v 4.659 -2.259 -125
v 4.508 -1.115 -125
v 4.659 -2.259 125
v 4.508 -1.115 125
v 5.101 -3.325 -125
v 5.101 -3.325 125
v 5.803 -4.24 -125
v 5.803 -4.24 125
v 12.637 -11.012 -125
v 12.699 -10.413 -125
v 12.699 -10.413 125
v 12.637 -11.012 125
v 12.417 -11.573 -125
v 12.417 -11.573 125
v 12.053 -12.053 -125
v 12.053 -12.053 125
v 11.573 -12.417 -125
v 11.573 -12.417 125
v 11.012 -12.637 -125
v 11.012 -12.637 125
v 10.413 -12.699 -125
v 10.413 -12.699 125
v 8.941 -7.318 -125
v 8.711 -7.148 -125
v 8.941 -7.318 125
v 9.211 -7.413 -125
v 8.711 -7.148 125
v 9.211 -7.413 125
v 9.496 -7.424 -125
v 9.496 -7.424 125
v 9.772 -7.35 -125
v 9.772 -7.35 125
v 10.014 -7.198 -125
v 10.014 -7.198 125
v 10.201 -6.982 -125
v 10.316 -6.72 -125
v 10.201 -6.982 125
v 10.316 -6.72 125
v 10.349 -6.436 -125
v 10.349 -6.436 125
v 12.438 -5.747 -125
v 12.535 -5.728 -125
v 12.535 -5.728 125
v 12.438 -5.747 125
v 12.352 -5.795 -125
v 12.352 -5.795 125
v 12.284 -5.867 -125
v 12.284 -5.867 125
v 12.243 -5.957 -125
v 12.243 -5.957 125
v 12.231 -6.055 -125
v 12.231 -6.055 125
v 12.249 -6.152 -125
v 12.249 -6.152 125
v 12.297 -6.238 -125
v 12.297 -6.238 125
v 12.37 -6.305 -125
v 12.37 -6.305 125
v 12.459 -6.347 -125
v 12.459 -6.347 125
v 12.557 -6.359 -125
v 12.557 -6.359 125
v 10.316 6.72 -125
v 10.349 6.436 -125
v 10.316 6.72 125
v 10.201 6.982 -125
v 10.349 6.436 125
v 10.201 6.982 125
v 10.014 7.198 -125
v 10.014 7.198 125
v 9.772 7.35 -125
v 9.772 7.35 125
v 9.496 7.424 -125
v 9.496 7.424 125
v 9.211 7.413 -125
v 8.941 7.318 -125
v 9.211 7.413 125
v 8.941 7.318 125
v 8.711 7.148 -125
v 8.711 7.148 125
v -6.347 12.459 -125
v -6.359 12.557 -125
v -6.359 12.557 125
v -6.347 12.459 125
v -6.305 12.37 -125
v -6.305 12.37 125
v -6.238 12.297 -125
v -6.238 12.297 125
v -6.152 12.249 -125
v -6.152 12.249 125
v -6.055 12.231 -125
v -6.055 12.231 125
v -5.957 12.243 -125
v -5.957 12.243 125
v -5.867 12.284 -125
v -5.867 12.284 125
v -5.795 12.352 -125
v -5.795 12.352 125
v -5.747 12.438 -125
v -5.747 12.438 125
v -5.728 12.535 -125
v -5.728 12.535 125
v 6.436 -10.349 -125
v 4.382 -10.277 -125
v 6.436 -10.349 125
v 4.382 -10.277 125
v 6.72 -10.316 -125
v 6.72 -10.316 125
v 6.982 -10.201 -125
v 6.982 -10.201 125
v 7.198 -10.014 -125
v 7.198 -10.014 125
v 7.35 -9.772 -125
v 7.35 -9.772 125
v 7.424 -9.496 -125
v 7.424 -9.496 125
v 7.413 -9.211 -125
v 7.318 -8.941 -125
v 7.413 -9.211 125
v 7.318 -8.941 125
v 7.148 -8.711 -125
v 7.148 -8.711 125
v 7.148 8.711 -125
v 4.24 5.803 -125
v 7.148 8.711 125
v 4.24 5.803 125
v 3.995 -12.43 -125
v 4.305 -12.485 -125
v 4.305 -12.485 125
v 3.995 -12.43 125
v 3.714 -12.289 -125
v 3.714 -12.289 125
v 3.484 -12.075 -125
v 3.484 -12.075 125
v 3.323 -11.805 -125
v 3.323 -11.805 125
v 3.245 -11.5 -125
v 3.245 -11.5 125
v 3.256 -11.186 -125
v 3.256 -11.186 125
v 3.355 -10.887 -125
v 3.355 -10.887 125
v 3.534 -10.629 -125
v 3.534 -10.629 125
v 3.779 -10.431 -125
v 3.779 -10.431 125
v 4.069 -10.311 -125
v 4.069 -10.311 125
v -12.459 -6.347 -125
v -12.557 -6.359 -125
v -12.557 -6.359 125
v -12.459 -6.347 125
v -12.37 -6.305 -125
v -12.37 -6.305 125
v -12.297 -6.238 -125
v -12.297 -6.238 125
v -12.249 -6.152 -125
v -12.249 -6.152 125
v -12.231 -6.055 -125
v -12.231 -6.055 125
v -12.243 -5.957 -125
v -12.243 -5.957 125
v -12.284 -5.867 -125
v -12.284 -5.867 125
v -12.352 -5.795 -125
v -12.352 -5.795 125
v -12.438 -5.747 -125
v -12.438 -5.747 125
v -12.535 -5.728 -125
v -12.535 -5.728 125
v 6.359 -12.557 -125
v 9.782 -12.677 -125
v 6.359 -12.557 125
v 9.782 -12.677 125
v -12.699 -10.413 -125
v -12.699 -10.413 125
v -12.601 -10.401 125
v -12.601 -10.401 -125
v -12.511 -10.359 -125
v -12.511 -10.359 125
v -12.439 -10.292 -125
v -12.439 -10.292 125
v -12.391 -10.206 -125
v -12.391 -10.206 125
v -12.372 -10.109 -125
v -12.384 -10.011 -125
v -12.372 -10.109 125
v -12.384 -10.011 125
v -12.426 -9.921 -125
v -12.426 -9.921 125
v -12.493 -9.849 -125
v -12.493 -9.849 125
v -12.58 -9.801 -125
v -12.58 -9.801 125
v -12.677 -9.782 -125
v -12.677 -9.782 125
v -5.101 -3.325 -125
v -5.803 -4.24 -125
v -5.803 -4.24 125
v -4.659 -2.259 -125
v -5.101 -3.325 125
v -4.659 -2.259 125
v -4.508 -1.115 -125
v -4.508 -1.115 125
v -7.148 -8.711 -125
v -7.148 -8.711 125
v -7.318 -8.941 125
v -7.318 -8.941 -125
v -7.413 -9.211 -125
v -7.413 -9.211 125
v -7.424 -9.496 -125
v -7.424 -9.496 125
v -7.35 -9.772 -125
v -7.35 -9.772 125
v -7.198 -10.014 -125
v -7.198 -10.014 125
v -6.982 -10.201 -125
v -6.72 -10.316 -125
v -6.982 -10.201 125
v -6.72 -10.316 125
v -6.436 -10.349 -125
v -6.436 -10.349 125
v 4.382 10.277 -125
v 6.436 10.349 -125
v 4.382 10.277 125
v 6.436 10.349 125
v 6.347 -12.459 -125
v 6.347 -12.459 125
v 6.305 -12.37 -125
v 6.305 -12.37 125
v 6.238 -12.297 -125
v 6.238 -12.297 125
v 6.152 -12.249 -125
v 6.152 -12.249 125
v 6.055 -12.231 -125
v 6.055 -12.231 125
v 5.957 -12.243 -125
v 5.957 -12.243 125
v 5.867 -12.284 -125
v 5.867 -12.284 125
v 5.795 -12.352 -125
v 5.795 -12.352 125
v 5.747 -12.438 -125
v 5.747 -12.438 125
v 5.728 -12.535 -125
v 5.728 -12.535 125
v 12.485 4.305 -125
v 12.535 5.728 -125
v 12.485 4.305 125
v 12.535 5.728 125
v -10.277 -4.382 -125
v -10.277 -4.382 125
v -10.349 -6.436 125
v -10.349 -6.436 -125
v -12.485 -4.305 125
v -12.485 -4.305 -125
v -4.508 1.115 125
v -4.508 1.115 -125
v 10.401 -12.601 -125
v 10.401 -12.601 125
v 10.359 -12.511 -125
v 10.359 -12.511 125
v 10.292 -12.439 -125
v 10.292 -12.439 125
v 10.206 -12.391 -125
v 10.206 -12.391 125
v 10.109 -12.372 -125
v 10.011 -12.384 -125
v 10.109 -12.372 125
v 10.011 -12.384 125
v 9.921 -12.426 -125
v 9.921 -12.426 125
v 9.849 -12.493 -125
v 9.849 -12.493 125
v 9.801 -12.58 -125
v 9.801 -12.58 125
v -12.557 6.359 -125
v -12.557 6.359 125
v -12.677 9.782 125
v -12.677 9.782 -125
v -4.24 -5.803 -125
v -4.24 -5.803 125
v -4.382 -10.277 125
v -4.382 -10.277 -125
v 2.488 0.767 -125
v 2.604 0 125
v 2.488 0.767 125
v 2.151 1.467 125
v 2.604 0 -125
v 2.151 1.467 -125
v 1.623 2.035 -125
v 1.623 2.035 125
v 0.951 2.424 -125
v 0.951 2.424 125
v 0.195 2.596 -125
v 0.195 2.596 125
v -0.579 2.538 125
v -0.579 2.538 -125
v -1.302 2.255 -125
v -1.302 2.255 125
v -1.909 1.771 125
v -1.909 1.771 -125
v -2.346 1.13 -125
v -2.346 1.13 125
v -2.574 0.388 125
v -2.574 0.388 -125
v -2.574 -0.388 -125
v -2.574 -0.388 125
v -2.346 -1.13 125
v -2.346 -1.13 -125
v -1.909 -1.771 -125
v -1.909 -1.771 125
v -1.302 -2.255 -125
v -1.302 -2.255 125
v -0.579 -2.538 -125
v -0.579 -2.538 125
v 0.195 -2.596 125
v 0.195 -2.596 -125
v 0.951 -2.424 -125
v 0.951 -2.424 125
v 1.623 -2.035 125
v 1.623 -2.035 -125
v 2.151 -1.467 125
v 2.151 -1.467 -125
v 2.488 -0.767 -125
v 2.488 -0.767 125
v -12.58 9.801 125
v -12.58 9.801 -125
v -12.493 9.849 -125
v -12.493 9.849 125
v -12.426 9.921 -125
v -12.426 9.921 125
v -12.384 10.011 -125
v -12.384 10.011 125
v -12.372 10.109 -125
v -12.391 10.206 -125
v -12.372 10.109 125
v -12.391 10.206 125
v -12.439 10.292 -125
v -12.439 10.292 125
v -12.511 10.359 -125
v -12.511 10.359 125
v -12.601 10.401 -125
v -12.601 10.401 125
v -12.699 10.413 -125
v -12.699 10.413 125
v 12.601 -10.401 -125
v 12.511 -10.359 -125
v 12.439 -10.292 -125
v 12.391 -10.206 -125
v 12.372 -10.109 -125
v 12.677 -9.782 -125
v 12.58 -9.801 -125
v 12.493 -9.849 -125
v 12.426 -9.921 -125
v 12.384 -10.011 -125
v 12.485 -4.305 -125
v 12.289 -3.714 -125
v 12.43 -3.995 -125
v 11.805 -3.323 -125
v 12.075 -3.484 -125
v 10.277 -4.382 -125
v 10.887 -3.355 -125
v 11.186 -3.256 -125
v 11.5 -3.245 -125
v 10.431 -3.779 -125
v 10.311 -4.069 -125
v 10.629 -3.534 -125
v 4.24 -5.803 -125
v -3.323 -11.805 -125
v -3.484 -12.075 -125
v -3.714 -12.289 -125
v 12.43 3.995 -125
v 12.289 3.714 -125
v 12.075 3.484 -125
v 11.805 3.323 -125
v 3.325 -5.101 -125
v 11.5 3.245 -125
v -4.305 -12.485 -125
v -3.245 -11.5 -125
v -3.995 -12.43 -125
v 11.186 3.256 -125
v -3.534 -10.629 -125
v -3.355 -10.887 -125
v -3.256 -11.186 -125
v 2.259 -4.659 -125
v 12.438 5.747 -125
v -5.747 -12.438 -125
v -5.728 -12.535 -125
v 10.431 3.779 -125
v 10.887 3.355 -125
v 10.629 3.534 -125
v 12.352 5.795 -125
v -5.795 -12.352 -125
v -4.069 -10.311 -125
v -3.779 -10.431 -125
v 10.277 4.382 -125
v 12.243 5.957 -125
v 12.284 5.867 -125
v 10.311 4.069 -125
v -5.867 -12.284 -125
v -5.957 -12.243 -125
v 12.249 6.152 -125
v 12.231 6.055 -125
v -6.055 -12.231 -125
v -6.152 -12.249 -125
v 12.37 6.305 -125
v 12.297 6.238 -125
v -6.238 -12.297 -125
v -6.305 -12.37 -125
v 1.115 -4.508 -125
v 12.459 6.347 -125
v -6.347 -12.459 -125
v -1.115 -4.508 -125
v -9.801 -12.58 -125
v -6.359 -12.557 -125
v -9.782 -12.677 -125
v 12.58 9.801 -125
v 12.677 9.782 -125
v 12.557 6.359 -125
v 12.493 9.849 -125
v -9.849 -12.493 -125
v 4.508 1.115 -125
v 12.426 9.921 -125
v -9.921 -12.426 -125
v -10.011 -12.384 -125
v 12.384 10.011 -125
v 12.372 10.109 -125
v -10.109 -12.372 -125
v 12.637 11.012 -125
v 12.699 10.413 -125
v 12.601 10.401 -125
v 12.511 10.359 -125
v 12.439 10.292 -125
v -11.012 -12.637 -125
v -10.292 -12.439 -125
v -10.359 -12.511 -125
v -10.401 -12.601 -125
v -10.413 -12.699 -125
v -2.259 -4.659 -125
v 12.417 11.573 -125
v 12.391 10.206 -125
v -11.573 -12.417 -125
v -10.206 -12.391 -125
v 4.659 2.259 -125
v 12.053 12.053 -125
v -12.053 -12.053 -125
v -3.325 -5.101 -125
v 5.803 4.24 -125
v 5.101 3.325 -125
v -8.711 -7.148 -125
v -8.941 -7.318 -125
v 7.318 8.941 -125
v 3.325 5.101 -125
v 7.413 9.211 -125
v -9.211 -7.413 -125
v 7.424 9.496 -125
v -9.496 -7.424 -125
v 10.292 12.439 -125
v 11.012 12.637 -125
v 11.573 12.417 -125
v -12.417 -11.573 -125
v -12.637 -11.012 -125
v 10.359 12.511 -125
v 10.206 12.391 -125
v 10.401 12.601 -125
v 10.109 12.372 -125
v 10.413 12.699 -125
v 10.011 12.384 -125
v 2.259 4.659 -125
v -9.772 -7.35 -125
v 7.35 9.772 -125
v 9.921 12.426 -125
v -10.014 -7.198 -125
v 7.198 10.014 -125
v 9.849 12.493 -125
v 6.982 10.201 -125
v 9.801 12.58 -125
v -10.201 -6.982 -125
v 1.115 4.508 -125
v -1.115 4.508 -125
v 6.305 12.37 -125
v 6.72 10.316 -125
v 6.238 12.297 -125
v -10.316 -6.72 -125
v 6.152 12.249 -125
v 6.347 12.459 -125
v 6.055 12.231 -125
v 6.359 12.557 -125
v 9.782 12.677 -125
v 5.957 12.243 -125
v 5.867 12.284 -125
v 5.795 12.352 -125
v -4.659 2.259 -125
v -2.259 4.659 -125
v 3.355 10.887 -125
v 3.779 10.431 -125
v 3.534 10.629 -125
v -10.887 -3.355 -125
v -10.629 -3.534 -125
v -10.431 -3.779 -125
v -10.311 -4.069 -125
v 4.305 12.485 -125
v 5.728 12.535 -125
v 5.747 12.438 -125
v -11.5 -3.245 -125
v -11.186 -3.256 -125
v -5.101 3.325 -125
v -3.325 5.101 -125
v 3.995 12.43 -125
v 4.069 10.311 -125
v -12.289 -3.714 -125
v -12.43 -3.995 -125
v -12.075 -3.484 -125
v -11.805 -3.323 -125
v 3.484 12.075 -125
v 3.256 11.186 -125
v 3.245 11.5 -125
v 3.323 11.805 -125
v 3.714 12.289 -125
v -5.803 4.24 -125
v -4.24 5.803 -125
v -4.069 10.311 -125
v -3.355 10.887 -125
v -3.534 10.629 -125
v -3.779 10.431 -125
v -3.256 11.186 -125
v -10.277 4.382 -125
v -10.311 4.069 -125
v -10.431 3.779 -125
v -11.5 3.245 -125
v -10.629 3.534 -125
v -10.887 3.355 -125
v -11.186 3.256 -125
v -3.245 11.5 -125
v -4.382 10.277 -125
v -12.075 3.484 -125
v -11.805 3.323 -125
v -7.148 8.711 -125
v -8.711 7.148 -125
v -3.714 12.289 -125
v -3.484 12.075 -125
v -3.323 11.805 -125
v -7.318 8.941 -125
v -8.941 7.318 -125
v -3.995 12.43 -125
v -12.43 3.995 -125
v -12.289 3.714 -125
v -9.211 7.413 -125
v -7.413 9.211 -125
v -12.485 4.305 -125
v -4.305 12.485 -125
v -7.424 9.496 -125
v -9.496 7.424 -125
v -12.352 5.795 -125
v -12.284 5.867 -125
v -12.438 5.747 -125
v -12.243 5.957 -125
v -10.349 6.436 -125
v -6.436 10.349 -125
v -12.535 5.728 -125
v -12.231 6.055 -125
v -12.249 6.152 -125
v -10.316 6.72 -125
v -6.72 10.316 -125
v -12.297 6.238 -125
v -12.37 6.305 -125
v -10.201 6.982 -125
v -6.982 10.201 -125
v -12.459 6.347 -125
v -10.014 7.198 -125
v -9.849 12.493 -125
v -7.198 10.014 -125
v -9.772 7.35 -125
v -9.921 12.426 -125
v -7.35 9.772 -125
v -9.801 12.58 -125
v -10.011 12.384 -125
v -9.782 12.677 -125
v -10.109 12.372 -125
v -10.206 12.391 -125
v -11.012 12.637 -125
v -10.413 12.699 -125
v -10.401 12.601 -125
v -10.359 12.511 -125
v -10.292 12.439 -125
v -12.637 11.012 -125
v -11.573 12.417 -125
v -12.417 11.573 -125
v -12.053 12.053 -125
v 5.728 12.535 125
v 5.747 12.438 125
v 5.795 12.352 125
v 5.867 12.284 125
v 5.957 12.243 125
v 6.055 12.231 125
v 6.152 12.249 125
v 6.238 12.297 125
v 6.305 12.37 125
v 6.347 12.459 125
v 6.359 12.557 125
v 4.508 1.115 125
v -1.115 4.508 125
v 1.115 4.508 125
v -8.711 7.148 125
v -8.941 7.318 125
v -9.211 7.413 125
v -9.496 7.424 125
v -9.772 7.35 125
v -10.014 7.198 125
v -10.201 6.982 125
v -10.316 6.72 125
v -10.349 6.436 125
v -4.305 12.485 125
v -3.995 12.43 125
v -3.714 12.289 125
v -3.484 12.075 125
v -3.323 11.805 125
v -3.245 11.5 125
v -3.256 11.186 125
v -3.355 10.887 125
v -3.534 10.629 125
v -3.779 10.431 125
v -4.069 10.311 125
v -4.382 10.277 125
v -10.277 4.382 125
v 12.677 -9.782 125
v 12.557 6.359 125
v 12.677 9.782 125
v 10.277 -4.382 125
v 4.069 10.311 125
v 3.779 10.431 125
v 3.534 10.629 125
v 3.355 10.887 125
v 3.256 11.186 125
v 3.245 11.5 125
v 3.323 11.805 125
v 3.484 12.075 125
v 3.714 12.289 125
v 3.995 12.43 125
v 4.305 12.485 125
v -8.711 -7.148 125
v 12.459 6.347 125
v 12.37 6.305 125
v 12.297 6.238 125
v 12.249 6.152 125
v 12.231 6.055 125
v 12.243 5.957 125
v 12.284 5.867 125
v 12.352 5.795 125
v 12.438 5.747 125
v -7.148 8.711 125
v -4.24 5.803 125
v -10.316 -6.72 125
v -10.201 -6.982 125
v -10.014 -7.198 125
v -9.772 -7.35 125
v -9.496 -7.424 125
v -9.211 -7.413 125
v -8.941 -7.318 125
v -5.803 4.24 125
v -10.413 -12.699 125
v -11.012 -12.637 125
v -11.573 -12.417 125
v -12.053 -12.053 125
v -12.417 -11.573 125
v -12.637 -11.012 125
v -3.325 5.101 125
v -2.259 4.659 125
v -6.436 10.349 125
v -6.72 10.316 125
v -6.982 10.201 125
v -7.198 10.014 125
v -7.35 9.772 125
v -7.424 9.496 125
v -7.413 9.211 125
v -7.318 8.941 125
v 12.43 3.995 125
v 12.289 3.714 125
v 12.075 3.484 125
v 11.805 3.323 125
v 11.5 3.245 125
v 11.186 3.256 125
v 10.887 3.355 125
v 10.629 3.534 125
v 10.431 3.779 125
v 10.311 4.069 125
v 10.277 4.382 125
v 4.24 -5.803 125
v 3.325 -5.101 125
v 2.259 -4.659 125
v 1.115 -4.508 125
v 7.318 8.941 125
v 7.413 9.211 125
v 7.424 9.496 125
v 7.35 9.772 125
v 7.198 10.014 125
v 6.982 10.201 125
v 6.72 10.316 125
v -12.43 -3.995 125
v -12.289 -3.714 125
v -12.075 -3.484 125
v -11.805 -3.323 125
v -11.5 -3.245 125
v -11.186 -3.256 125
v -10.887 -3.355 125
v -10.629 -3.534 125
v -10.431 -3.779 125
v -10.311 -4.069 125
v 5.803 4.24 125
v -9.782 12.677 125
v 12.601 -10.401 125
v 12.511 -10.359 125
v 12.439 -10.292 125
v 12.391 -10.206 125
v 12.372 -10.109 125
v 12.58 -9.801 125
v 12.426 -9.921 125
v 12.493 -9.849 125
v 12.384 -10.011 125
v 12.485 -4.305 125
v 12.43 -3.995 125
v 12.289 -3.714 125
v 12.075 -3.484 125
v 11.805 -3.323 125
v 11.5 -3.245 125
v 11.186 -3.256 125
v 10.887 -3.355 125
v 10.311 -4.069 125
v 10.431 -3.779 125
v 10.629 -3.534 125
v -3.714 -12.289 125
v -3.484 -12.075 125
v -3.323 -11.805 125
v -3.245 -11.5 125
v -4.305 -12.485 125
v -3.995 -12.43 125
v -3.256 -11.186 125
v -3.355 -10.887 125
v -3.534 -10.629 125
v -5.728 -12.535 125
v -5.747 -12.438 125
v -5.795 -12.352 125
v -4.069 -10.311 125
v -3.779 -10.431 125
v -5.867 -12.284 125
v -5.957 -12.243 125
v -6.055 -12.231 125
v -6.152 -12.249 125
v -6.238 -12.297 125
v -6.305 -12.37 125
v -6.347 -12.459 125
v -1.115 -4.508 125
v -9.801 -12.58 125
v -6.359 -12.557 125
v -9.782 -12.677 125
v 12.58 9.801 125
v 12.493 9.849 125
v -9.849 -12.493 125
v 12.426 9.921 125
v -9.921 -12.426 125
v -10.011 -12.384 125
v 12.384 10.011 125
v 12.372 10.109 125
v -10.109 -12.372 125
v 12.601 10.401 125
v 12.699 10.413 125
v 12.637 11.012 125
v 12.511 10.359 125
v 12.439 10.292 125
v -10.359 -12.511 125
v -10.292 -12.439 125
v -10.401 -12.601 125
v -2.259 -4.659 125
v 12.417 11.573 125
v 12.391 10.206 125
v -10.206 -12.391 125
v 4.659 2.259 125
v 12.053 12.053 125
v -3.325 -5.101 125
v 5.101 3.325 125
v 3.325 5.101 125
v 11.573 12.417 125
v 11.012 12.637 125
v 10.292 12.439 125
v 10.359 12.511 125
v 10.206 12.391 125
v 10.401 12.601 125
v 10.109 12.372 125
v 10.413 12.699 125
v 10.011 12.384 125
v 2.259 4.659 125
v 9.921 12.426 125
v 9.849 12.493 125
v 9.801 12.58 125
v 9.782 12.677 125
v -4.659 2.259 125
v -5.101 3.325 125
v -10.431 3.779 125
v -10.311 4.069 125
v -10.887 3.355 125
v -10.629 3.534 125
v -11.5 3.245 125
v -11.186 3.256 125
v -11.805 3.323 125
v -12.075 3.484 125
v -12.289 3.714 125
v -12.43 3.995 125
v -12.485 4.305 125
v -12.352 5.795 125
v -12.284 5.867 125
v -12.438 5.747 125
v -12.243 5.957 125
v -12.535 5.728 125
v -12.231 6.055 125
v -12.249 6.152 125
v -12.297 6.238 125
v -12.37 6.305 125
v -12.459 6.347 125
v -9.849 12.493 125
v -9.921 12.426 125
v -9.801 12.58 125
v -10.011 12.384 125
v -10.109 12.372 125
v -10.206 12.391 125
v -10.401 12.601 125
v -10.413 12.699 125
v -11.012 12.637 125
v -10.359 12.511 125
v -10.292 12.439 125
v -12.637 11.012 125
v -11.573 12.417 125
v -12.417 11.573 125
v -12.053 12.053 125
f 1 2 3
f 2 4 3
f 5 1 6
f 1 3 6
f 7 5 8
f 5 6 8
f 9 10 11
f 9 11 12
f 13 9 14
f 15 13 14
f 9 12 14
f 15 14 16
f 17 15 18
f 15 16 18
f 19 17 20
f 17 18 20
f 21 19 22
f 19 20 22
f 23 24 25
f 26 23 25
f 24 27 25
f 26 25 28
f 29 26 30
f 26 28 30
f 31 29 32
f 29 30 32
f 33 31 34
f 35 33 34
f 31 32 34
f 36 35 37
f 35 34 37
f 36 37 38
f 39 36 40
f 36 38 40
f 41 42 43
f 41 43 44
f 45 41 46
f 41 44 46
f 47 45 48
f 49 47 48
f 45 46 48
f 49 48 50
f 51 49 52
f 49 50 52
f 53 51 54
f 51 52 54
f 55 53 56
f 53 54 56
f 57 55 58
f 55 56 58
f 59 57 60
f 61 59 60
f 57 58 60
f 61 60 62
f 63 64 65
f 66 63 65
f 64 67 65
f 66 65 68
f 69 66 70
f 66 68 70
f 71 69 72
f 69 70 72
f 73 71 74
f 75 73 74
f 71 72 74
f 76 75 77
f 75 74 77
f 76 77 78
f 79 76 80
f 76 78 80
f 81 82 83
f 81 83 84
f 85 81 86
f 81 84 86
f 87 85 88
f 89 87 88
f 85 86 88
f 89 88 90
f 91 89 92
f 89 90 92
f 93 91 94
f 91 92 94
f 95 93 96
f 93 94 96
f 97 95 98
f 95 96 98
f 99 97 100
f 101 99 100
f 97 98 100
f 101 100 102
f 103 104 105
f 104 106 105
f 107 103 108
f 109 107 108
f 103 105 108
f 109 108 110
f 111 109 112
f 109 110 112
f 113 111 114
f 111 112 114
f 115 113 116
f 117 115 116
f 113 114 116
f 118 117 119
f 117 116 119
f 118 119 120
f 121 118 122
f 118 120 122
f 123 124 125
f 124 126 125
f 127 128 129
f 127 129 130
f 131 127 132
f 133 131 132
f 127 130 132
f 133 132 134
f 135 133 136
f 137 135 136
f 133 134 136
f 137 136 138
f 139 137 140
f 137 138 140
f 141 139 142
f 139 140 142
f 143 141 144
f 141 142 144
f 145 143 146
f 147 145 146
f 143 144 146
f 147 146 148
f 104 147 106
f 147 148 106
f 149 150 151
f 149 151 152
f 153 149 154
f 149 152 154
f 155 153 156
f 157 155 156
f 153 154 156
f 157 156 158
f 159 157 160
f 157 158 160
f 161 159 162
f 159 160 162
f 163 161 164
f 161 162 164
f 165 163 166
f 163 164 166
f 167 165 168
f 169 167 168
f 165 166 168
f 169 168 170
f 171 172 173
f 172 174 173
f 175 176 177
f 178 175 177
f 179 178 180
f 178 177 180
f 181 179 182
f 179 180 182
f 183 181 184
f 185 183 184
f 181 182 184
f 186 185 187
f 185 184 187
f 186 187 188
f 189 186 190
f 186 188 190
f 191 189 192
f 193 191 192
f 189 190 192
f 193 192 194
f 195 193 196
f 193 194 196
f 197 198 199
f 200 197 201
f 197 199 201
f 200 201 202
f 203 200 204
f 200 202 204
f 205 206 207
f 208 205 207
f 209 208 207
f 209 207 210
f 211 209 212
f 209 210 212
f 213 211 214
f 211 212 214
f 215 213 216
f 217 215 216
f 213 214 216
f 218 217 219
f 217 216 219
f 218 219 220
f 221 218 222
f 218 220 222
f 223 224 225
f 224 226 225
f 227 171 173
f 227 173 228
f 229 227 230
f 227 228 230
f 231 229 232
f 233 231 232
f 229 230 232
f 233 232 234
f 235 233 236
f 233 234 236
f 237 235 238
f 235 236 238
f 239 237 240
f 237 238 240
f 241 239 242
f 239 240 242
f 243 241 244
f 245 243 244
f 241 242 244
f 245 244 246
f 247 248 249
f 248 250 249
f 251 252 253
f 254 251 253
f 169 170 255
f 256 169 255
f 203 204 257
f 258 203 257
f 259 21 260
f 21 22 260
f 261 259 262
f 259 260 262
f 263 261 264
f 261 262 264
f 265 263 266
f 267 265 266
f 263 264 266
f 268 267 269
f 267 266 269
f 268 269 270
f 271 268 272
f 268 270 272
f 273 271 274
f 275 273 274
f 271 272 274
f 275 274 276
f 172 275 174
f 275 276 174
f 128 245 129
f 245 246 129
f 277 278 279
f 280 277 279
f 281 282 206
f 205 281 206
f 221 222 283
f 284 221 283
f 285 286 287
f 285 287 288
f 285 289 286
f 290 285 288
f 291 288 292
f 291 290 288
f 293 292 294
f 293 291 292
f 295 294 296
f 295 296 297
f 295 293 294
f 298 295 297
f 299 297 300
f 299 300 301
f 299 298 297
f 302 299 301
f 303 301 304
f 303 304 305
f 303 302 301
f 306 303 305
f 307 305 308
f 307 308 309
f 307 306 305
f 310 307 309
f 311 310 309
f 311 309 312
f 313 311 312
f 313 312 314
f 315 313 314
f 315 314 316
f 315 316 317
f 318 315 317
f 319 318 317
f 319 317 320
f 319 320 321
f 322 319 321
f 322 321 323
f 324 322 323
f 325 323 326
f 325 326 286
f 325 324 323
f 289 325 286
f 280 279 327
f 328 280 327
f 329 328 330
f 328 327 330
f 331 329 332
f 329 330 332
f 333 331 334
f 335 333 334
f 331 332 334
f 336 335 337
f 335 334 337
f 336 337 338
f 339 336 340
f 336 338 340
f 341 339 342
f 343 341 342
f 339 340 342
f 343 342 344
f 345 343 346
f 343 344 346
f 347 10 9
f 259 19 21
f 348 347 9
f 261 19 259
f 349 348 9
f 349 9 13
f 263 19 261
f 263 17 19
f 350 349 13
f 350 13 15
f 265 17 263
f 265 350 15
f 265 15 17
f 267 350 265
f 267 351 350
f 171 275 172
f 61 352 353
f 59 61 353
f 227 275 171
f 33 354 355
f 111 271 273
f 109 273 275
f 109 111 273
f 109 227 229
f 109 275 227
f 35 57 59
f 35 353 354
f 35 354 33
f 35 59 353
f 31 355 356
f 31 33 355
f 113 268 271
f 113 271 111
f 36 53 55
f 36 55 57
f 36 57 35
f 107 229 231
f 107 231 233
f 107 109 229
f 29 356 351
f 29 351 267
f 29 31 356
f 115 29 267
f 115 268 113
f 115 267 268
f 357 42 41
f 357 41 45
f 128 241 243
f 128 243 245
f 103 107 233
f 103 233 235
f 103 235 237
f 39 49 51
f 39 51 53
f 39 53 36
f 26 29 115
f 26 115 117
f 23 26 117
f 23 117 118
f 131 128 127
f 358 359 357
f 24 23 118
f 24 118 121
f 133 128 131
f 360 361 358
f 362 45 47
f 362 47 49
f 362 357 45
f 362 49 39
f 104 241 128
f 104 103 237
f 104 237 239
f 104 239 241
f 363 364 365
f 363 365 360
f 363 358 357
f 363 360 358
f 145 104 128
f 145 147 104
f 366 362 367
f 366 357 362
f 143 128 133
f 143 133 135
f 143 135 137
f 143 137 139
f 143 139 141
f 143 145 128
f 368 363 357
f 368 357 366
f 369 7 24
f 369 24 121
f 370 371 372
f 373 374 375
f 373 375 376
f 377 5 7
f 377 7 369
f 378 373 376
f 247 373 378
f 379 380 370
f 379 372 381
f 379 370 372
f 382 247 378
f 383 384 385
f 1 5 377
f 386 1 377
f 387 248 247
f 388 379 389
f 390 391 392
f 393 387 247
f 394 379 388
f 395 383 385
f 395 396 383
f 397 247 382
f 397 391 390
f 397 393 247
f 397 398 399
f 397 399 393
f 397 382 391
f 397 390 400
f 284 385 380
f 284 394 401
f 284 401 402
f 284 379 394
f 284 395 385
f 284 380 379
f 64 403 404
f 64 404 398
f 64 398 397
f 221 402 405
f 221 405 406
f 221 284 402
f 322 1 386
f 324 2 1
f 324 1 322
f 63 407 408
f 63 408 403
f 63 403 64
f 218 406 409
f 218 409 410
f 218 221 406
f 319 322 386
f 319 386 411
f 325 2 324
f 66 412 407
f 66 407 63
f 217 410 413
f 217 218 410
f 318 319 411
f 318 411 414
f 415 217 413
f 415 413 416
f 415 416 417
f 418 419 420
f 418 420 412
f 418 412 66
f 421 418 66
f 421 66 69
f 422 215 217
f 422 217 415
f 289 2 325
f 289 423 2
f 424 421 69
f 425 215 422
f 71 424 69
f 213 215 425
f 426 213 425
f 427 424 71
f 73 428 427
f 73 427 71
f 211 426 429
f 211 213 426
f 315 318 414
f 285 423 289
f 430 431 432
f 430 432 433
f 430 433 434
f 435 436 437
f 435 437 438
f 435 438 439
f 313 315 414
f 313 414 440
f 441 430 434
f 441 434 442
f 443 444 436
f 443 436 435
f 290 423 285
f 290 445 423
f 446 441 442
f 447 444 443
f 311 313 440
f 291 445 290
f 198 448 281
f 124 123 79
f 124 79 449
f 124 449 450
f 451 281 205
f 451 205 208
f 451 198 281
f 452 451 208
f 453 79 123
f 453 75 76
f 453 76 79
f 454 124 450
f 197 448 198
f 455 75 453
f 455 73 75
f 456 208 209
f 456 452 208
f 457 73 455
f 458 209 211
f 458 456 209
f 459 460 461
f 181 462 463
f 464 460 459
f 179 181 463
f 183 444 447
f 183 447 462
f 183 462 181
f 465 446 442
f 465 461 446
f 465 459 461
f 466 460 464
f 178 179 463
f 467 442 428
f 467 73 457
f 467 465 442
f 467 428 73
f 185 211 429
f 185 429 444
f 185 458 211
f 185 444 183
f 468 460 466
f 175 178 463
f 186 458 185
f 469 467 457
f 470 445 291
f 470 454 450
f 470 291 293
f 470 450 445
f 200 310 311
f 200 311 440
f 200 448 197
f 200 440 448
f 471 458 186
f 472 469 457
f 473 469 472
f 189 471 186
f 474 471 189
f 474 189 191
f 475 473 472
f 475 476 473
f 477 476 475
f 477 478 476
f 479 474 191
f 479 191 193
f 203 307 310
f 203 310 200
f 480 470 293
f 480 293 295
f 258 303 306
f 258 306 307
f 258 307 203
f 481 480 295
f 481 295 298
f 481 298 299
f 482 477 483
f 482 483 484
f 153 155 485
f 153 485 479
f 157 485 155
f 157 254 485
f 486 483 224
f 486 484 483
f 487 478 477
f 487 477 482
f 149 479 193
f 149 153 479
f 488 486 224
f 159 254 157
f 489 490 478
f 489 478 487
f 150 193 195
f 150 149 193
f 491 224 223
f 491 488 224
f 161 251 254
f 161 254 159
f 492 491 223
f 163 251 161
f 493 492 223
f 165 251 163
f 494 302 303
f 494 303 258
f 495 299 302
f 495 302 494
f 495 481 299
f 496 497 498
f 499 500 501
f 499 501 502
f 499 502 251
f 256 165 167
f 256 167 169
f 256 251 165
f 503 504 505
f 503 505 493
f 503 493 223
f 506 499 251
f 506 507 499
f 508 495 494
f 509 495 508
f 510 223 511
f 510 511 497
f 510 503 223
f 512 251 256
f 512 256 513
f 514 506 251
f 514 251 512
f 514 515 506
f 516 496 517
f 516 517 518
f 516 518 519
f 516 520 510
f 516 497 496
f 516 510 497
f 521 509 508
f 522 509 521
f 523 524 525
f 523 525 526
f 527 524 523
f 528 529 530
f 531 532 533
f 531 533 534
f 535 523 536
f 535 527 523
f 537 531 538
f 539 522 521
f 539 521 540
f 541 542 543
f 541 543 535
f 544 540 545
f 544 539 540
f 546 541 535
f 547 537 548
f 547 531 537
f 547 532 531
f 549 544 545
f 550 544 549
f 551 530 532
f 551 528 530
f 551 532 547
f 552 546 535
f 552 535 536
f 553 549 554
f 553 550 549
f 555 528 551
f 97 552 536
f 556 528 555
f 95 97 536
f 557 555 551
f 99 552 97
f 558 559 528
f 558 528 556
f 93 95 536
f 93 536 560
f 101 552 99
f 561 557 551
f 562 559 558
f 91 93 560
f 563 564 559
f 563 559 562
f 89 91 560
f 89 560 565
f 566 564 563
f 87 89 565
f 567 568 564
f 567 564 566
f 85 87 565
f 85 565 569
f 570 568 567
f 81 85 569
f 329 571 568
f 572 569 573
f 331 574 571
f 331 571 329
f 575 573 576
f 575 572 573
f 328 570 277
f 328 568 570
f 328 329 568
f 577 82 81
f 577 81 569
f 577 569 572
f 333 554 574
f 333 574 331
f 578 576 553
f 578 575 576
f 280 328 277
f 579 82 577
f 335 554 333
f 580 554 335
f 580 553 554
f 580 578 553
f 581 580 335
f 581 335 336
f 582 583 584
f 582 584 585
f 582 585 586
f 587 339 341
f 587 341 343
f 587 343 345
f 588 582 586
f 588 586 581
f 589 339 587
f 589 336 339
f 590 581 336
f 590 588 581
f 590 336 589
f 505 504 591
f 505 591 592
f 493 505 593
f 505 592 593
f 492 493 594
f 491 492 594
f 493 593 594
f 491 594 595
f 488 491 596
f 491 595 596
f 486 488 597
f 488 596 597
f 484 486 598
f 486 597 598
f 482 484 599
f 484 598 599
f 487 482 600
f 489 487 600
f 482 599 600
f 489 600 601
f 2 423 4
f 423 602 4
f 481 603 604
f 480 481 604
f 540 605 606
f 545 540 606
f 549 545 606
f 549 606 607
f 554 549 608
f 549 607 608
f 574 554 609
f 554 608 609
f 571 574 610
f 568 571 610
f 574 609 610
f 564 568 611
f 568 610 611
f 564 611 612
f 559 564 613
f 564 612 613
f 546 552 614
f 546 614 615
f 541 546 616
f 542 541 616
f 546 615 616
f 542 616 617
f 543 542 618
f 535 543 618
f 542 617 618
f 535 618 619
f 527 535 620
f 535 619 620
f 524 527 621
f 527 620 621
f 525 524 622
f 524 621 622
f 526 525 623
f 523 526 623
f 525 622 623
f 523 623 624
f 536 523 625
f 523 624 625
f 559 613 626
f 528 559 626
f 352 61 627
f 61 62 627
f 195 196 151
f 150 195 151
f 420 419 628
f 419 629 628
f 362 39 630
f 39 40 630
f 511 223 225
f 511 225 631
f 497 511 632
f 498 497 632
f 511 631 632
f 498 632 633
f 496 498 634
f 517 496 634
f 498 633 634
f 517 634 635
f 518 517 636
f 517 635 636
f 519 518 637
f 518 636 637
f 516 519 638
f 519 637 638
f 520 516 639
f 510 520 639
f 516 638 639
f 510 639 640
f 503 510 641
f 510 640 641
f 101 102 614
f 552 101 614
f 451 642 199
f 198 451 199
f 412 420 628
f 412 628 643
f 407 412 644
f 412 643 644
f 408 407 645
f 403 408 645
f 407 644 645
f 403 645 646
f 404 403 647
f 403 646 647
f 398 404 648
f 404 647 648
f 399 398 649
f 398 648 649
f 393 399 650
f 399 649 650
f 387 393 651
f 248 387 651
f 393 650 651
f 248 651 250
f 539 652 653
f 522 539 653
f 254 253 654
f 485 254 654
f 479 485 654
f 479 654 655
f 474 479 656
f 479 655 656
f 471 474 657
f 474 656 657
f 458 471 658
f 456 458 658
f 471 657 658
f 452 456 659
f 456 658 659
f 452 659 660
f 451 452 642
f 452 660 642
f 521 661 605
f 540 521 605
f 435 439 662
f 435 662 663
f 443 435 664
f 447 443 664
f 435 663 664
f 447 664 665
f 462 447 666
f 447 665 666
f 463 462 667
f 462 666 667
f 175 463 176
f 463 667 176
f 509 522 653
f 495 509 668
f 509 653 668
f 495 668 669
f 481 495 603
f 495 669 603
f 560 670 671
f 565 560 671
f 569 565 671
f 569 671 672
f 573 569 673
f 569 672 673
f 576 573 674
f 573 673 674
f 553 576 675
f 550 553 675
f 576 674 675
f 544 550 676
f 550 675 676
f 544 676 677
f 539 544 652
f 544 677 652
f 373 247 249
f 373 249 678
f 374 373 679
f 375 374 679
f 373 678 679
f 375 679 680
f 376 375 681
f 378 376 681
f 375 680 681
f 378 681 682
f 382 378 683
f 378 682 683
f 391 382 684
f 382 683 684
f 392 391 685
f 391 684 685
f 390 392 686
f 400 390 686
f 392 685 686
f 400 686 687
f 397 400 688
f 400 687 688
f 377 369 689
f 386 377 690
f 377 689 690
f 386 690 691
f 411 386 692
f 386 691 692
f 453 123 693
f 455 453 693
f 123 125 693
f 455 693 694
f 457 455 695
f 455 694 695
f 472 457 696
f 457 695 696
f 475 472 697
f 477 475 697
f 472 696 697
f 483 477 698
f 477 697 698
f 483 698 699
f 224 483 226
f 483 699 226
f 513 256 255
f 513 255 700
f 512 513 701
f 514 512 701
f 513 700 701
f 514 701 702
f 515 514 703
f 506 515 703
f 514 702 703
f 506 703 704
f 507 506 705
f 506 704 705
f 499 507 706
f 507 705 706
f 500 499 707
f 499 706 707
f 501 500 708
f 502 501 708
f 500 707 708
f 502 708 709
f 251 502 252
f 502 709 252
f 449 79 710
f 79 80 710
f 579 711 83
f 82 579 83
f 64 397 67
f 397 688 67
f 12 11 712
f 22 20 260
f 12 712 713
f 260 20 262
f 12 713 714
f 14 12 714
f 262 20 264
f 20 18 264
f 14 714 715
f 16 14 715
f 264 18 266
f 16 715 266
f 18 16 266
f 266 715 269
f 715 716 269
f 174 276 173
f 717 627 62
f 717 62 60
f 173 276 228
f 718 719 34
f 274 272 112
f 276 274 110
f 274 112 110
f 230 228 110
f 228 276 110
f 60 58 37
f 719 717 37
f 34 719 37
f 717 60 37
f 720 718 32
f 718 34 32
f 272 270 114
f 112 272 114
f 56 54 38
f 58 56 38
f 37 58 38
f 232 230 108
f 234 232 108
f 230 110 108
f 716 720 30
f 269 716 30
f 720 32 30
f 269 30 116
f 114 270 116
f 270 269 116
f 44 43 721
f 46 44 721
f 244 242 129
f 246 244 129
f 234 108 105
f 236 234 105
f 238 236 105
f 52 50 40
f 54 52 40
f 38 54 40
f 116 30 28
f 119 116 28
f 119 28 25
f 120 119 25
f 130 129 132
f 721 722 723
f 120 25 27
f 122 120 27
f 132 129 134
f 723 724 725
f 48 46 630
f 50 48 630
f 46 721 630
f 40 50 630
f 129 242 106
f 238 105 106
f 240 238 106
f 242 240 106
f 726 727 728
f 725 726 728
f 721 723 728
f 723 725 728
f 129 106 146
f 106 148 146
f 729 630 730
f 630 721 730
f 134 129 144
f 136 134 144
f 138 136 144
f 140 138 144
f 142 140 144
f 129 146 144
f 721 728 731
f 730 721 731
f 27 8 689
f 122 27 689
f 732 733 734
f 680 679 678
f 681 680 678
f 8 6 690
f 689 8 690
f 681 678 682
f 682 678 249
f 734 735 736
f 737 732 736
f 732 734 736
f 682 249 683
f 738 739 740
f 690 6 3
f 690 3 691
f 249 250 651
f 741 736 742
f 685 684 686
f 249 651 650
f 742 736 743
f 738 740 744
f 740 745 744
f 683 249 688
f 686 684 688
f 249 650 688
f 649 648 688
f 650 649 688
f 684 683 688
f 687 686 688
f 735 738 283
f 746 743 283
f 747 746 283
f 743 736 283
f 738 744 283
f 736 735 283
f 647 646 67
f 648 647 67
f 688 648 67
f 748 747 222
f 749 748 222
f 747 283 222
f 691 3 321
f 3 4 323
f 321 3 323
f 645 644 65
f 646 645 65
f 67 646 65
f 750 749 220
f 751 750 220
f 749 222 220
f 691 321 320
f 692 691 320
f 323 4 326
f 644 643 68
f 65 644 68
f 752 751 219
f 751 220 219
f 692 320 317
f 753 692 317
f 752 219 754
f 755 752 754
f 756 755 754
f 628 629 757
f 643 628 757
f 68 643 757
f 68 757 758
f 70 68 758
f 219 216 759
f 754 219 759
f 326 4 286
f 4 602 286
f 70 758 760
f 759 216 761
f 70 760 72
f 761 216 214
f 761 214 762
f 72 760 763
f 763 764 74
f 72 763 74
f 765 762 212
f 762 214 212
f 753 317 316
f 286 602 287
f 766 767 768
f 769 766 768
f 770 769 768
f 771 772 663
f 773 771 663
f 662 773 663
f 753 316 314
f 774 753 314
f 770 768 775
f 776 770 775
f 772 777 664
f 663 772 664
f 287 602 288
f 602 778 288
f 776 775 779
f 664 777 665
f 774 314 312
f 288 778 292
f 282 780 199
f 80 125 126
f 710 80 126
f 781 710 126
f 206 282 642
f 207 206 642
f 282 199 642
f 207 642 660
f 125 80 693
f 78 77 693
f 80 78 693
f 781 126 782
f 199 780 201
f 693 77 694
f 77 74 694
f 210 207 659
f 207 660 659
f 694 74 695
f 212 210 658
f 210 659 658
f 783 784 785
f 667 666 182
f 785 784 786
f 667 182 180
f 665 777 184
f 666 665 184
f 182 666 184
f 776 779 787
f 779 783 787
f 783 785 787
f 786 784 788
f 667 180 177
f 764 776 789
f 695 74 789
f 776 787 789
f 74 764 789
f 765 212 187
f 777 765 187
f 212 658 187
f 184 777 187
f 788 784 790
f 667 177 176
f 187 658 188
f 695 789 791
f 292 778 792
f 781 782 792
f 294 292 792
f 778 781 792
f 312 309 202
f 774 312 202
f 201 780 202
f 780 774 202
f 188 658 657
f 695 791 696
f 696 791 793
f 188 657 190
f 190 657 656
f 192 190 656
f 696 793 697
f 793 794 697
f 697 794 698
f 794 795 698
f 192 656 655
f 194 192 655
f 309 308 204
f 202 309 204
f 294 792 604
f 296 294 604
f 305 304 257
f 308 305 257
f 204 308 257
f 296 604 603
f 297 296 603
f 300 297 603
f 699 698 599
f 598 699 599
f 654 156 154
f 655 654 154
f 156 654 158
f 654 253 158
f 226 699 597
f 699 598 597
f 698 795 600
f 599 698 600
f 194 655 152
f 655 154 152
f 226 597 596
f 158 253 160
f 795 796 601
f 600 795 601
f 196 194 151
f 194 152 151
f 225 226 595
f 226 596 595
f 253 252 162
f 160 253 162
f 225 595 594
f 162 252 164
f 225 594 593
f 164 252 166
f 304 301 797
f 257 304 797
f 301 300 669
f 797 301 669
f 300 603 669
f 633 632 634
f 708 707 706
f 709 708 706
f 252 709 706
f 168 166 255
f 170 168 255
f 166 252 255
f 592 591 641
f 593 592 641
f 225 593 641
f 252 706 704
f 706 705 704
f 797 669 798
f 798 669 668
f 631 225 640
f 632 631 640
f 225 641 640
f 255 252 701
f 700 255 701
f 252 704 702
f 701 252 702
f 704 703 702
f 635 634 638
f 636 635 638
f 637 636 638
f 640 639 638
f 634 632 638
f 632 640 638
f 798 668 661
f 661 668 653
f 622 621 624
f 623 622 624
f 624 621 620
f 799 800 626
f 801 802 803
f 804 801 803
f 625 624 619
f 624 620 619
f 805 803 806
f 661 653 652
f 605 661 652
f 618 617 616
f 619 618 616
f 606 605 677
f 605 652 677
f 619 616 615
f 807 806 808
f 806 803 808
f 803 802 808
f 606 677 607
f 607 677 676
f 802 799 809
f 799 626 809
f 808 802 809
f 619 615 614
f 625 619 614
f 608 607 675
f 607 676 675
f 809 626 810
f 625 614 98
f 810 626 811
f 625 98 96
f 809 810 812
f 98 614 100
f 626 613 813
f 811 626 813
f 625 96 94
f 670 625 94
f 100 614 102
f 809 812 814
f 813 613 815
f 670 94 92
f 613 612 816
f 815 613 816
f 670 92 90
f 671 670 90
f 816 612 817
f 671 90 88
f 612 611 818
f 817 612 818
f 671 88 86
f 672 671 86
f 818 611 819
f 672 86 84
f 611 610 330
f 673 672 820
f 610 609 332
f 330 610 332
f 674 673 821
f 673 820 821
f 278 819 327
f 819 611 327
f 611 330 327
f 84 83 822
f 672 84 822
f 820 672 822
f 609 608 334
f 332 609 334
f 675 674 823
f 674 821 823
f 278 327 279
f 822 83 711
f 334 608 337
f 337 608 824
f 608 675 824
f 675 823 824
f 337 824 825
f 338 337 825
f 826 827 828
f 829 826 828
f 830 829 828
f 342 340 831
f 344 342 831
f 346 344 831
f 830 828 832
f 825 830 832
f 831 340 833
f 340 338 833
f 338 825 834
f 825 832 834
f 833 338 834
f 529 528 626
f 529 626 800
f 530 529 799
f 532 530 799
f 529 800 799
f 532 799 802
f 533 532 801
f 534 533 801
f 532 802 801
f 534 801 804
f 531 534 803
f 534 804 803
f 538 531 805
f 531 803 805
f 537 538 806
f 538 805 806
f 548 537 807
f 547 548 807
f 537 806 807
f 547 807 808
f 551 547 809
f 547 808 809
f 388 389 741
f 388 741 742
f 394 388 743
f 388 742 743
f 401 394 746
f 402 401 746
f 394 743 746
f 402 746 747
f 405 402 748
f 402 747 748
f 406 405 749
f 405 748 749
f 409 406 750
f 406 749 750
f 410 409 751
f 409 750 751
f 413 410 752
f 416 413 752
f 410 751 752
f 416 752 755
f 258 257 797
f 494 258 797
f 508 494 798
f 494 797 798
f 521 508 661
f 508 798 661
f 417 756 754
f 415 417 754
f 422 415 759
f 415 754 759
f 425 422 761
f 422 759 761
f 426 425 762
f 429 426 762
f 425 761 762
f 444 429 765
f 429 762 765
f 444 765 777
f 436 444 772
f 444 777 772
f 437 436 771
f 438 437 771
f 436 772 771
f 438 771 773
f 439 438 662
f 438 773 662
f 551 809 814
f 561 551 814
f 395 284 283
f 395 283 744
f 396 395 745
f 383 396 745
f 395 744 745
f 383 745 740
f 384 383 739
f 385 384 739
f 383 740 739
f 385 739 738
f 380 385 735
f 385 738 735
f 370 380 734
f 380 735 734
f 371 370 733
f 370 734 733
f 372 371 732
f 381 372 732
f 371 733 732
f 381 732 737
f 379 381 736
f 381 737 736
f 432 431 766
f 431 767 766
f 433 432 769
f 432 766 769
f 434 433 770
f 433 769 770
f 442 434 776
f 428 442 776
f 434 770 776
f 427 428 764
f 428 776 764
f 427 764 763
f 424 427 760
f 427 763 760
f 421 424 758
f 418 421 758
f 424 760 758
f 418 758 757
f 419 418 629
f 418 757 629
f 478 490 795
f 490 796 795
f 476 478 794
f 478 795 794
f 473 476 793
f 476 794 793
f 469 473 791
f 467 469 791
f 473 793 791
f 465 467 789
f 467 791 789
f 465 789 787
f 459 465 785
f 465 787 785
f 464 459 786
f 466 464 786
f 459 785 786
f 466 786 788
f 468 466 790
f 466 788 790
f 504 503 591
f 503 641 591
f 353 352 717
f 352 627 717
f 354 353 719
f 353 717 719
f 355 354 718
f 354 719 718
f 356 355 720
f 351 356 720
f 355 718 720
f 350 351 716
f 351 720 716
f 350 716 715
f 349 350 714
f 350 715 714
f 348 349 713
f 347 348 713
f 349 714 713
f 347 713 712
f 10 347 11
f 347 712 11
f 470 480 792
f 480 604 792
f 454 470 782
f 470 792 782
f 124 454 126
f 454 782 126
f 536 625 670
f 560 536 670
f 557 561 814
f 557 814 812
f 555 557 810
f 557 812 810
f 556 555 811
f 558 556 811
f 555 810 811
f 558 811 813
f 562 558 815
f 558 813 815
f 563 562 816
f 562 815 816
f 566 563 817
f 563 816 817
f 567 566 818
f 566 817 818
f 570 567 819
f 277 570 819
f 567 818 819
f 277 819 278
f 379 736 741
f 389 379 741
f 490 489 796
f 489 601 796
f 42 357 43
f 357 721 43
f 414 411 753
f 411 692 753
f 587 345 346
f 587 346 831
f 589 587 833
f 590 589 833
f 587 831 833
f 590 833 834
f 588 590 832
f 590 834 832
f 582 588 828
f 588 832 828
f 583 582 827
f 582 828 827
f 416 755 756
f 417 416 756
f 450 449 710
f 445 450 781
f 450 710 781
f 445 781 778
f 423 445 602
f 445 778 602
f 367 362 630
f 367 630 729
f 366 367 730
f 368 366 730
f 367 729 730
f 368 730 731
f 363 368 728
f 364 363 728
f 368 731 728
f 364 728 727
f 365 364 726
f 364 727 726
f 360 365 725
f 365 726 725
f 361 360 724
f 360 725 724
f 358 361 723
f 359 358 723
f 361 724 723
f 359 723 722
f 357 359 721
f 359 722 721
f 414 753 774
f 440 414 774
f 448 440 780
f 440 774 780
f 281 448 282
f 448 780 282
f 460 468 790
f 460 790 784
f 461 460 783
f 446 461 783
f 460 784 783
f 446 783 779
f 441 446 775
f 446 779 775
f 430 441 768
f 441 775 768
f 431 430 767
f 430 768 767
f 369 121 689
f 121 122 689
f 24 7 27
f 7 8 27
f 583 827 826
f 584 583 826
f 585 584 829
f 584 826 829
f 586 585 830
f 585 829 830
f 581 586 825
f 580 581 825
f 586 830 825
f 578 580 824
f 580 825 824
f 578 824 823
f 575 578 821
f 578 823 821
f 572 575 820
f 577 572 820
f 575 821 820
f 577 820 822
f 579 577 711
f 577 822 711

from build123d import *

# Parameters (mm, degrees)
SKETCH3_R      = 2.6035
EXTRUDE1_DEPTH = 125


with BuildPart() as part:
    # Sketch3 → Extrude1 (new body, symmetric)
    with BuildSketch(Plane.XY):
        with BuildLine():
            Line((-1.115277175, 4.5085), (1.115277175, 4.5085))
            ThreePointArc((1.115277175, 4.5085), (2.806584872, 4.844922018), (4.240406305, 5.80297087))
            Line((4.240406305, 5.80297087), (7.148423664, 8.710988229))
            ThreePointArc((7.148423664, 8.710988229), (7.349906316, 9.772227925), (6.436353897, 10.348636575))
            Line((6.436353897, 10.348636575), (4.381960454, 10.276895575))
            ThreePointArc((4.381960454, 10.276895575), (3.239173075, 11.342562046), (4.304839546, 12.485349424))
            Line((4.304839546, 12.485349424), (5.728246175, 12.535055879))
            ThreePointArc((5.728246175, 12.535055879), (6.054756855, 12.230579745), (6.35923299, 12.557090424))
            Line((6.35923299, 12.557090424), (9.782092278, 12.676619304))
            ThreePointArc((9.782092278, 12.676619304), (10.108602958, 12.37214317), (10.413079092, 12.69865385))
            ThreePointArc((10.413079092, 12.69865385), (12.052764565, 12.052764565), (12.69865385, 10.413079092))
            ThreePointArc((12.69865385, 10.413079092), (12.37214317, 10.108602958), (12.676619304, 9.782092278))
            Line((12.676619304, 9.782092278), (12.557090424, 6.35923299))
            ThreePointArc((12.557090424, 6.35923299), (12.230579745, 6.054756855), (12.535055879, 5.728246175))
            Line((12.535055879, 5.728246175), (12.485349424, 4.304839546))
            ThreePointArc((12.485349424, 4.304839546), (11.342562046, 3.239173075), (10.276895575, 4.381960454))
            Line((10.276895575, 4.381960454), (10.348636575, 6.436353897))
            ThreePointArc((10.348636575, 6.436353897), (9.772227925, 7.349906316), (8.710988229, 7.148423664))
            Line((8.710988229, 7.148423664), (5.80297087, 4.240406305))
            ThreePointArc((5.80297087, 4.240406305), (4.844922018, 2.806584872), (4.5085, 1.115277175))
            Line((4.5085, 1.115277175), (4.5085, -1.115277175))
            ThreePointArc((4.5085, -1.115277175), (4.844922018, -2.806584872), (5.80297087, -4.240406305))
            Line((5.80297087, -4.240406305), (8.710988229, -7.148423664))
            ThreePointArc((8.710988229, -7.148423664), (9.772227925, -7.349906316), (10.348636575, -6.436353897))
            Line((10.348636575, -6.436353897), (10.276895575, -4.381960454))
            ThreePointArc((10.276895575, -4.381960454), (11.342562046, -3.239173075), (12.485349424, -4.304839546))
            Line((12.485349424, -4.304839546), (12.535055879, -5.728246175))
            ThreePointArc((12.535055879, -5.728246175), (12.230579745, -6.054756855), (12.557090424, -6.35923299))
            Line((12.557090424, -6.35923299), (12.676619304, -9.782092278))
            ThreePointArc((12.676619304, -9.782092278), (12.37214317, -10.108602958), (12.69865385, -10.413079092))
            ThreePointArc((12.69865385, -10.413079092), (12.052764565, -12.052764565), (10.413079092, -12.69865385))
            ThreePointArc((10.413079092, -12.69865385), (10.108602958, -12.37214317), (9.782092278, -12.676619304))
            Line((9.782092278, -12.676619304), (6.35923299, -12.557090424))
            ThreePointArc((6.35923299, -12.557090424), (6.054756855, -12.230579745), (5.728246175, -12.535055879))
            Line((5.728246175, -12.535055879), (4.304839546, -12.485349424))
            ThreePointArc((4.304839546, -12.485349424), (3.239173075, -11.342562046), (4.381960454, -10.276895575))
            Line((4.381960454, -10.276895575), (6.436353897, -10.348636575))
            ThreePointArc((6.436353897, -10.348636575), (7.349906316, -9.772227925), (7.148423664, -8.710988229))
            Line((7.148423664, -8.710988229), (4.240406305, -5.80297087))
            ThreePointArc((4.240406305, -5.80297087), (2.806584872, -4.844922018), (1.115277175, -4.5085))
            Line((1.115277175, -4.5085), (-1.115277175, -4.5085))
            ThreePointArc((-1.115277175, -4.5085), (-2.806584872, -4.844922018), (-4.240406305, -5.80297087))
            Line((-4.240406305, -5.80297087), (-7.148423664, -8.710988229))
            ThreePointArc((-7.148423664, -8.710988229), (-7.349906316, -9.772227925), (-6.436353897, -10.348636575))
            Line((-6.436353897, -10.348636575), (-4.381960454, -10.276895575))
            ThreePointArc((-4.381960454, -10.276895575), (-3.239173075, -11.342562046), (-4.304839546, -12.485349424))
            Line((-4.304839546, -12.485349424), (-5.728246175, -12.535055879))
            ThreePointArc((-5.728246175, -12.535055879), (-6.054756855, -12.230579745), (-6.35923299, -12.557090424))
            Line((-6.35923299, -12.557090424), (-9.782092278, -12.676619304))
            ThreePointArc((-9.782092278, -12.676619304), (-10.108602958, -12.37214317), (-10.413079092, -12.69865385))
            ThreePointArc((-10.413079092, -12.69865385), (-12.052764565, -12.052764565), (-12.69865385, -10.413079092))
            ThreePointArc((-12.69865385, -10.413079092), (-12.37214317, -10.108602958), (-12.676619304, -9.782092278))
            Line((-12.676619304, -9.782092278), (-12.557090424, -6.35923299))
            ThreePointArc((-12.557090424, -6.35923299), (-12.230579745, -6.054756855), (-12.535055879, -5.728246175))
            Line((-12.535055879, -5.728246175), (-12.485349424, -4.304839546))
            ThreePointArc((-12.485349424, -4.304839546), (-11.342562046, -3.239173075), (-10.276895575, -4.381960454))
            Line((-10.276895575, -4.381960454), (-10.348636575, -6.436353897))
            ThreePointArc((-10.348636575, -6.436353897), (-9.772227925, -7.349906316), (-8.710988229, -7.148423664))
            Line((-8.710988229, -7.148423664), (-5.80297087, -4.240406305))
            ThreePointArc((-5.80297087, -4.240406305), (-4.844922018, -2.806584872), (-4.5085, -1.115277175))
            Line((-4.5085, -1.115277175), (-4.5085, 1.115277175))
            ThreePointArc((-4.5085, 1.115277175), (-4.844922018, 2.806584872), (-5.80297087, 4.240406305))
            Line((-5.80297087, 4.240406305), (-8.710988229, 7.148423664))
            ThreePointArc((-8.710988229, 7.148423664), (-9.772227925, 7.349906316), (-10.348636575, 6.436353897))
            Line((-10.348636575, 6.436353897), (-10.276895575, 4.381960454))
            ThreePointArc((-10.276895575, 4.381960454), (-11.342562046, 3.239173075), (-12.485349424, 4.304839546))
            Line((-12.485349424, 4.304839546), (-12.535055879, 5.728246175))
            ThreePointArc((-12.535055879, 5.728246175), (-12.230579745, 6.054756855), (-12.557090424, 6.35923299))
            Line((-12.557090424, 6.35923299), (-12.676619304, 9.782092278))
            ThreePointArc((-12.676619304, 9.782092278), (-12.37214317, 10.108602958), (-12.69865385, 10.413079092))
            ThreePointArc((-12.69865385, 10.413079092), (-12.052764565, 12.052764565), (-10.413079092, 12.69865385))
            ThreePointArc((-10.413079092, 12.69865385), (-10.108602958, 12.37214317), (-9.782092278, 12.676619304))
            Line((-9.782092278, 12.676619304), (-6.35923299, 12.557090424))
            ThreePointArc((-6.35923299, 12.557090424), (-6.054756855, 12.230579745), (-5.728246175, 12.535055879))
            Line((-5.728246175, 12.535055879), (-4.304839546, 12.485349424))
            ThreePointArc((-4.304839546, 12.485349424), (-3.239173075, 11.342562046), (-4.381960454, 10.276895575))
            Line((-4.381960454, 10.276895575), (-6.436353897, 10.348636575))
            ThreePointArc((-6.436353897, 10.348636575), (-7.349906316, 9.772227925), (-7.148423664, 8.710988229))
            Line((-7.148423664, 8.710988229), (-4.240406305, 5.80297087))
            ThreePointArc((-4.240406305, 5.80297087), (-2.806584872, 4.844922018), (-1.115277175, 4.5085))
        make_face()
        Circle(SKETCH3_R, mode=Mode.SUBTRACT)
    extrude(amount=EXTRUDE1_DEPTH, both=True)


solid = part.part
